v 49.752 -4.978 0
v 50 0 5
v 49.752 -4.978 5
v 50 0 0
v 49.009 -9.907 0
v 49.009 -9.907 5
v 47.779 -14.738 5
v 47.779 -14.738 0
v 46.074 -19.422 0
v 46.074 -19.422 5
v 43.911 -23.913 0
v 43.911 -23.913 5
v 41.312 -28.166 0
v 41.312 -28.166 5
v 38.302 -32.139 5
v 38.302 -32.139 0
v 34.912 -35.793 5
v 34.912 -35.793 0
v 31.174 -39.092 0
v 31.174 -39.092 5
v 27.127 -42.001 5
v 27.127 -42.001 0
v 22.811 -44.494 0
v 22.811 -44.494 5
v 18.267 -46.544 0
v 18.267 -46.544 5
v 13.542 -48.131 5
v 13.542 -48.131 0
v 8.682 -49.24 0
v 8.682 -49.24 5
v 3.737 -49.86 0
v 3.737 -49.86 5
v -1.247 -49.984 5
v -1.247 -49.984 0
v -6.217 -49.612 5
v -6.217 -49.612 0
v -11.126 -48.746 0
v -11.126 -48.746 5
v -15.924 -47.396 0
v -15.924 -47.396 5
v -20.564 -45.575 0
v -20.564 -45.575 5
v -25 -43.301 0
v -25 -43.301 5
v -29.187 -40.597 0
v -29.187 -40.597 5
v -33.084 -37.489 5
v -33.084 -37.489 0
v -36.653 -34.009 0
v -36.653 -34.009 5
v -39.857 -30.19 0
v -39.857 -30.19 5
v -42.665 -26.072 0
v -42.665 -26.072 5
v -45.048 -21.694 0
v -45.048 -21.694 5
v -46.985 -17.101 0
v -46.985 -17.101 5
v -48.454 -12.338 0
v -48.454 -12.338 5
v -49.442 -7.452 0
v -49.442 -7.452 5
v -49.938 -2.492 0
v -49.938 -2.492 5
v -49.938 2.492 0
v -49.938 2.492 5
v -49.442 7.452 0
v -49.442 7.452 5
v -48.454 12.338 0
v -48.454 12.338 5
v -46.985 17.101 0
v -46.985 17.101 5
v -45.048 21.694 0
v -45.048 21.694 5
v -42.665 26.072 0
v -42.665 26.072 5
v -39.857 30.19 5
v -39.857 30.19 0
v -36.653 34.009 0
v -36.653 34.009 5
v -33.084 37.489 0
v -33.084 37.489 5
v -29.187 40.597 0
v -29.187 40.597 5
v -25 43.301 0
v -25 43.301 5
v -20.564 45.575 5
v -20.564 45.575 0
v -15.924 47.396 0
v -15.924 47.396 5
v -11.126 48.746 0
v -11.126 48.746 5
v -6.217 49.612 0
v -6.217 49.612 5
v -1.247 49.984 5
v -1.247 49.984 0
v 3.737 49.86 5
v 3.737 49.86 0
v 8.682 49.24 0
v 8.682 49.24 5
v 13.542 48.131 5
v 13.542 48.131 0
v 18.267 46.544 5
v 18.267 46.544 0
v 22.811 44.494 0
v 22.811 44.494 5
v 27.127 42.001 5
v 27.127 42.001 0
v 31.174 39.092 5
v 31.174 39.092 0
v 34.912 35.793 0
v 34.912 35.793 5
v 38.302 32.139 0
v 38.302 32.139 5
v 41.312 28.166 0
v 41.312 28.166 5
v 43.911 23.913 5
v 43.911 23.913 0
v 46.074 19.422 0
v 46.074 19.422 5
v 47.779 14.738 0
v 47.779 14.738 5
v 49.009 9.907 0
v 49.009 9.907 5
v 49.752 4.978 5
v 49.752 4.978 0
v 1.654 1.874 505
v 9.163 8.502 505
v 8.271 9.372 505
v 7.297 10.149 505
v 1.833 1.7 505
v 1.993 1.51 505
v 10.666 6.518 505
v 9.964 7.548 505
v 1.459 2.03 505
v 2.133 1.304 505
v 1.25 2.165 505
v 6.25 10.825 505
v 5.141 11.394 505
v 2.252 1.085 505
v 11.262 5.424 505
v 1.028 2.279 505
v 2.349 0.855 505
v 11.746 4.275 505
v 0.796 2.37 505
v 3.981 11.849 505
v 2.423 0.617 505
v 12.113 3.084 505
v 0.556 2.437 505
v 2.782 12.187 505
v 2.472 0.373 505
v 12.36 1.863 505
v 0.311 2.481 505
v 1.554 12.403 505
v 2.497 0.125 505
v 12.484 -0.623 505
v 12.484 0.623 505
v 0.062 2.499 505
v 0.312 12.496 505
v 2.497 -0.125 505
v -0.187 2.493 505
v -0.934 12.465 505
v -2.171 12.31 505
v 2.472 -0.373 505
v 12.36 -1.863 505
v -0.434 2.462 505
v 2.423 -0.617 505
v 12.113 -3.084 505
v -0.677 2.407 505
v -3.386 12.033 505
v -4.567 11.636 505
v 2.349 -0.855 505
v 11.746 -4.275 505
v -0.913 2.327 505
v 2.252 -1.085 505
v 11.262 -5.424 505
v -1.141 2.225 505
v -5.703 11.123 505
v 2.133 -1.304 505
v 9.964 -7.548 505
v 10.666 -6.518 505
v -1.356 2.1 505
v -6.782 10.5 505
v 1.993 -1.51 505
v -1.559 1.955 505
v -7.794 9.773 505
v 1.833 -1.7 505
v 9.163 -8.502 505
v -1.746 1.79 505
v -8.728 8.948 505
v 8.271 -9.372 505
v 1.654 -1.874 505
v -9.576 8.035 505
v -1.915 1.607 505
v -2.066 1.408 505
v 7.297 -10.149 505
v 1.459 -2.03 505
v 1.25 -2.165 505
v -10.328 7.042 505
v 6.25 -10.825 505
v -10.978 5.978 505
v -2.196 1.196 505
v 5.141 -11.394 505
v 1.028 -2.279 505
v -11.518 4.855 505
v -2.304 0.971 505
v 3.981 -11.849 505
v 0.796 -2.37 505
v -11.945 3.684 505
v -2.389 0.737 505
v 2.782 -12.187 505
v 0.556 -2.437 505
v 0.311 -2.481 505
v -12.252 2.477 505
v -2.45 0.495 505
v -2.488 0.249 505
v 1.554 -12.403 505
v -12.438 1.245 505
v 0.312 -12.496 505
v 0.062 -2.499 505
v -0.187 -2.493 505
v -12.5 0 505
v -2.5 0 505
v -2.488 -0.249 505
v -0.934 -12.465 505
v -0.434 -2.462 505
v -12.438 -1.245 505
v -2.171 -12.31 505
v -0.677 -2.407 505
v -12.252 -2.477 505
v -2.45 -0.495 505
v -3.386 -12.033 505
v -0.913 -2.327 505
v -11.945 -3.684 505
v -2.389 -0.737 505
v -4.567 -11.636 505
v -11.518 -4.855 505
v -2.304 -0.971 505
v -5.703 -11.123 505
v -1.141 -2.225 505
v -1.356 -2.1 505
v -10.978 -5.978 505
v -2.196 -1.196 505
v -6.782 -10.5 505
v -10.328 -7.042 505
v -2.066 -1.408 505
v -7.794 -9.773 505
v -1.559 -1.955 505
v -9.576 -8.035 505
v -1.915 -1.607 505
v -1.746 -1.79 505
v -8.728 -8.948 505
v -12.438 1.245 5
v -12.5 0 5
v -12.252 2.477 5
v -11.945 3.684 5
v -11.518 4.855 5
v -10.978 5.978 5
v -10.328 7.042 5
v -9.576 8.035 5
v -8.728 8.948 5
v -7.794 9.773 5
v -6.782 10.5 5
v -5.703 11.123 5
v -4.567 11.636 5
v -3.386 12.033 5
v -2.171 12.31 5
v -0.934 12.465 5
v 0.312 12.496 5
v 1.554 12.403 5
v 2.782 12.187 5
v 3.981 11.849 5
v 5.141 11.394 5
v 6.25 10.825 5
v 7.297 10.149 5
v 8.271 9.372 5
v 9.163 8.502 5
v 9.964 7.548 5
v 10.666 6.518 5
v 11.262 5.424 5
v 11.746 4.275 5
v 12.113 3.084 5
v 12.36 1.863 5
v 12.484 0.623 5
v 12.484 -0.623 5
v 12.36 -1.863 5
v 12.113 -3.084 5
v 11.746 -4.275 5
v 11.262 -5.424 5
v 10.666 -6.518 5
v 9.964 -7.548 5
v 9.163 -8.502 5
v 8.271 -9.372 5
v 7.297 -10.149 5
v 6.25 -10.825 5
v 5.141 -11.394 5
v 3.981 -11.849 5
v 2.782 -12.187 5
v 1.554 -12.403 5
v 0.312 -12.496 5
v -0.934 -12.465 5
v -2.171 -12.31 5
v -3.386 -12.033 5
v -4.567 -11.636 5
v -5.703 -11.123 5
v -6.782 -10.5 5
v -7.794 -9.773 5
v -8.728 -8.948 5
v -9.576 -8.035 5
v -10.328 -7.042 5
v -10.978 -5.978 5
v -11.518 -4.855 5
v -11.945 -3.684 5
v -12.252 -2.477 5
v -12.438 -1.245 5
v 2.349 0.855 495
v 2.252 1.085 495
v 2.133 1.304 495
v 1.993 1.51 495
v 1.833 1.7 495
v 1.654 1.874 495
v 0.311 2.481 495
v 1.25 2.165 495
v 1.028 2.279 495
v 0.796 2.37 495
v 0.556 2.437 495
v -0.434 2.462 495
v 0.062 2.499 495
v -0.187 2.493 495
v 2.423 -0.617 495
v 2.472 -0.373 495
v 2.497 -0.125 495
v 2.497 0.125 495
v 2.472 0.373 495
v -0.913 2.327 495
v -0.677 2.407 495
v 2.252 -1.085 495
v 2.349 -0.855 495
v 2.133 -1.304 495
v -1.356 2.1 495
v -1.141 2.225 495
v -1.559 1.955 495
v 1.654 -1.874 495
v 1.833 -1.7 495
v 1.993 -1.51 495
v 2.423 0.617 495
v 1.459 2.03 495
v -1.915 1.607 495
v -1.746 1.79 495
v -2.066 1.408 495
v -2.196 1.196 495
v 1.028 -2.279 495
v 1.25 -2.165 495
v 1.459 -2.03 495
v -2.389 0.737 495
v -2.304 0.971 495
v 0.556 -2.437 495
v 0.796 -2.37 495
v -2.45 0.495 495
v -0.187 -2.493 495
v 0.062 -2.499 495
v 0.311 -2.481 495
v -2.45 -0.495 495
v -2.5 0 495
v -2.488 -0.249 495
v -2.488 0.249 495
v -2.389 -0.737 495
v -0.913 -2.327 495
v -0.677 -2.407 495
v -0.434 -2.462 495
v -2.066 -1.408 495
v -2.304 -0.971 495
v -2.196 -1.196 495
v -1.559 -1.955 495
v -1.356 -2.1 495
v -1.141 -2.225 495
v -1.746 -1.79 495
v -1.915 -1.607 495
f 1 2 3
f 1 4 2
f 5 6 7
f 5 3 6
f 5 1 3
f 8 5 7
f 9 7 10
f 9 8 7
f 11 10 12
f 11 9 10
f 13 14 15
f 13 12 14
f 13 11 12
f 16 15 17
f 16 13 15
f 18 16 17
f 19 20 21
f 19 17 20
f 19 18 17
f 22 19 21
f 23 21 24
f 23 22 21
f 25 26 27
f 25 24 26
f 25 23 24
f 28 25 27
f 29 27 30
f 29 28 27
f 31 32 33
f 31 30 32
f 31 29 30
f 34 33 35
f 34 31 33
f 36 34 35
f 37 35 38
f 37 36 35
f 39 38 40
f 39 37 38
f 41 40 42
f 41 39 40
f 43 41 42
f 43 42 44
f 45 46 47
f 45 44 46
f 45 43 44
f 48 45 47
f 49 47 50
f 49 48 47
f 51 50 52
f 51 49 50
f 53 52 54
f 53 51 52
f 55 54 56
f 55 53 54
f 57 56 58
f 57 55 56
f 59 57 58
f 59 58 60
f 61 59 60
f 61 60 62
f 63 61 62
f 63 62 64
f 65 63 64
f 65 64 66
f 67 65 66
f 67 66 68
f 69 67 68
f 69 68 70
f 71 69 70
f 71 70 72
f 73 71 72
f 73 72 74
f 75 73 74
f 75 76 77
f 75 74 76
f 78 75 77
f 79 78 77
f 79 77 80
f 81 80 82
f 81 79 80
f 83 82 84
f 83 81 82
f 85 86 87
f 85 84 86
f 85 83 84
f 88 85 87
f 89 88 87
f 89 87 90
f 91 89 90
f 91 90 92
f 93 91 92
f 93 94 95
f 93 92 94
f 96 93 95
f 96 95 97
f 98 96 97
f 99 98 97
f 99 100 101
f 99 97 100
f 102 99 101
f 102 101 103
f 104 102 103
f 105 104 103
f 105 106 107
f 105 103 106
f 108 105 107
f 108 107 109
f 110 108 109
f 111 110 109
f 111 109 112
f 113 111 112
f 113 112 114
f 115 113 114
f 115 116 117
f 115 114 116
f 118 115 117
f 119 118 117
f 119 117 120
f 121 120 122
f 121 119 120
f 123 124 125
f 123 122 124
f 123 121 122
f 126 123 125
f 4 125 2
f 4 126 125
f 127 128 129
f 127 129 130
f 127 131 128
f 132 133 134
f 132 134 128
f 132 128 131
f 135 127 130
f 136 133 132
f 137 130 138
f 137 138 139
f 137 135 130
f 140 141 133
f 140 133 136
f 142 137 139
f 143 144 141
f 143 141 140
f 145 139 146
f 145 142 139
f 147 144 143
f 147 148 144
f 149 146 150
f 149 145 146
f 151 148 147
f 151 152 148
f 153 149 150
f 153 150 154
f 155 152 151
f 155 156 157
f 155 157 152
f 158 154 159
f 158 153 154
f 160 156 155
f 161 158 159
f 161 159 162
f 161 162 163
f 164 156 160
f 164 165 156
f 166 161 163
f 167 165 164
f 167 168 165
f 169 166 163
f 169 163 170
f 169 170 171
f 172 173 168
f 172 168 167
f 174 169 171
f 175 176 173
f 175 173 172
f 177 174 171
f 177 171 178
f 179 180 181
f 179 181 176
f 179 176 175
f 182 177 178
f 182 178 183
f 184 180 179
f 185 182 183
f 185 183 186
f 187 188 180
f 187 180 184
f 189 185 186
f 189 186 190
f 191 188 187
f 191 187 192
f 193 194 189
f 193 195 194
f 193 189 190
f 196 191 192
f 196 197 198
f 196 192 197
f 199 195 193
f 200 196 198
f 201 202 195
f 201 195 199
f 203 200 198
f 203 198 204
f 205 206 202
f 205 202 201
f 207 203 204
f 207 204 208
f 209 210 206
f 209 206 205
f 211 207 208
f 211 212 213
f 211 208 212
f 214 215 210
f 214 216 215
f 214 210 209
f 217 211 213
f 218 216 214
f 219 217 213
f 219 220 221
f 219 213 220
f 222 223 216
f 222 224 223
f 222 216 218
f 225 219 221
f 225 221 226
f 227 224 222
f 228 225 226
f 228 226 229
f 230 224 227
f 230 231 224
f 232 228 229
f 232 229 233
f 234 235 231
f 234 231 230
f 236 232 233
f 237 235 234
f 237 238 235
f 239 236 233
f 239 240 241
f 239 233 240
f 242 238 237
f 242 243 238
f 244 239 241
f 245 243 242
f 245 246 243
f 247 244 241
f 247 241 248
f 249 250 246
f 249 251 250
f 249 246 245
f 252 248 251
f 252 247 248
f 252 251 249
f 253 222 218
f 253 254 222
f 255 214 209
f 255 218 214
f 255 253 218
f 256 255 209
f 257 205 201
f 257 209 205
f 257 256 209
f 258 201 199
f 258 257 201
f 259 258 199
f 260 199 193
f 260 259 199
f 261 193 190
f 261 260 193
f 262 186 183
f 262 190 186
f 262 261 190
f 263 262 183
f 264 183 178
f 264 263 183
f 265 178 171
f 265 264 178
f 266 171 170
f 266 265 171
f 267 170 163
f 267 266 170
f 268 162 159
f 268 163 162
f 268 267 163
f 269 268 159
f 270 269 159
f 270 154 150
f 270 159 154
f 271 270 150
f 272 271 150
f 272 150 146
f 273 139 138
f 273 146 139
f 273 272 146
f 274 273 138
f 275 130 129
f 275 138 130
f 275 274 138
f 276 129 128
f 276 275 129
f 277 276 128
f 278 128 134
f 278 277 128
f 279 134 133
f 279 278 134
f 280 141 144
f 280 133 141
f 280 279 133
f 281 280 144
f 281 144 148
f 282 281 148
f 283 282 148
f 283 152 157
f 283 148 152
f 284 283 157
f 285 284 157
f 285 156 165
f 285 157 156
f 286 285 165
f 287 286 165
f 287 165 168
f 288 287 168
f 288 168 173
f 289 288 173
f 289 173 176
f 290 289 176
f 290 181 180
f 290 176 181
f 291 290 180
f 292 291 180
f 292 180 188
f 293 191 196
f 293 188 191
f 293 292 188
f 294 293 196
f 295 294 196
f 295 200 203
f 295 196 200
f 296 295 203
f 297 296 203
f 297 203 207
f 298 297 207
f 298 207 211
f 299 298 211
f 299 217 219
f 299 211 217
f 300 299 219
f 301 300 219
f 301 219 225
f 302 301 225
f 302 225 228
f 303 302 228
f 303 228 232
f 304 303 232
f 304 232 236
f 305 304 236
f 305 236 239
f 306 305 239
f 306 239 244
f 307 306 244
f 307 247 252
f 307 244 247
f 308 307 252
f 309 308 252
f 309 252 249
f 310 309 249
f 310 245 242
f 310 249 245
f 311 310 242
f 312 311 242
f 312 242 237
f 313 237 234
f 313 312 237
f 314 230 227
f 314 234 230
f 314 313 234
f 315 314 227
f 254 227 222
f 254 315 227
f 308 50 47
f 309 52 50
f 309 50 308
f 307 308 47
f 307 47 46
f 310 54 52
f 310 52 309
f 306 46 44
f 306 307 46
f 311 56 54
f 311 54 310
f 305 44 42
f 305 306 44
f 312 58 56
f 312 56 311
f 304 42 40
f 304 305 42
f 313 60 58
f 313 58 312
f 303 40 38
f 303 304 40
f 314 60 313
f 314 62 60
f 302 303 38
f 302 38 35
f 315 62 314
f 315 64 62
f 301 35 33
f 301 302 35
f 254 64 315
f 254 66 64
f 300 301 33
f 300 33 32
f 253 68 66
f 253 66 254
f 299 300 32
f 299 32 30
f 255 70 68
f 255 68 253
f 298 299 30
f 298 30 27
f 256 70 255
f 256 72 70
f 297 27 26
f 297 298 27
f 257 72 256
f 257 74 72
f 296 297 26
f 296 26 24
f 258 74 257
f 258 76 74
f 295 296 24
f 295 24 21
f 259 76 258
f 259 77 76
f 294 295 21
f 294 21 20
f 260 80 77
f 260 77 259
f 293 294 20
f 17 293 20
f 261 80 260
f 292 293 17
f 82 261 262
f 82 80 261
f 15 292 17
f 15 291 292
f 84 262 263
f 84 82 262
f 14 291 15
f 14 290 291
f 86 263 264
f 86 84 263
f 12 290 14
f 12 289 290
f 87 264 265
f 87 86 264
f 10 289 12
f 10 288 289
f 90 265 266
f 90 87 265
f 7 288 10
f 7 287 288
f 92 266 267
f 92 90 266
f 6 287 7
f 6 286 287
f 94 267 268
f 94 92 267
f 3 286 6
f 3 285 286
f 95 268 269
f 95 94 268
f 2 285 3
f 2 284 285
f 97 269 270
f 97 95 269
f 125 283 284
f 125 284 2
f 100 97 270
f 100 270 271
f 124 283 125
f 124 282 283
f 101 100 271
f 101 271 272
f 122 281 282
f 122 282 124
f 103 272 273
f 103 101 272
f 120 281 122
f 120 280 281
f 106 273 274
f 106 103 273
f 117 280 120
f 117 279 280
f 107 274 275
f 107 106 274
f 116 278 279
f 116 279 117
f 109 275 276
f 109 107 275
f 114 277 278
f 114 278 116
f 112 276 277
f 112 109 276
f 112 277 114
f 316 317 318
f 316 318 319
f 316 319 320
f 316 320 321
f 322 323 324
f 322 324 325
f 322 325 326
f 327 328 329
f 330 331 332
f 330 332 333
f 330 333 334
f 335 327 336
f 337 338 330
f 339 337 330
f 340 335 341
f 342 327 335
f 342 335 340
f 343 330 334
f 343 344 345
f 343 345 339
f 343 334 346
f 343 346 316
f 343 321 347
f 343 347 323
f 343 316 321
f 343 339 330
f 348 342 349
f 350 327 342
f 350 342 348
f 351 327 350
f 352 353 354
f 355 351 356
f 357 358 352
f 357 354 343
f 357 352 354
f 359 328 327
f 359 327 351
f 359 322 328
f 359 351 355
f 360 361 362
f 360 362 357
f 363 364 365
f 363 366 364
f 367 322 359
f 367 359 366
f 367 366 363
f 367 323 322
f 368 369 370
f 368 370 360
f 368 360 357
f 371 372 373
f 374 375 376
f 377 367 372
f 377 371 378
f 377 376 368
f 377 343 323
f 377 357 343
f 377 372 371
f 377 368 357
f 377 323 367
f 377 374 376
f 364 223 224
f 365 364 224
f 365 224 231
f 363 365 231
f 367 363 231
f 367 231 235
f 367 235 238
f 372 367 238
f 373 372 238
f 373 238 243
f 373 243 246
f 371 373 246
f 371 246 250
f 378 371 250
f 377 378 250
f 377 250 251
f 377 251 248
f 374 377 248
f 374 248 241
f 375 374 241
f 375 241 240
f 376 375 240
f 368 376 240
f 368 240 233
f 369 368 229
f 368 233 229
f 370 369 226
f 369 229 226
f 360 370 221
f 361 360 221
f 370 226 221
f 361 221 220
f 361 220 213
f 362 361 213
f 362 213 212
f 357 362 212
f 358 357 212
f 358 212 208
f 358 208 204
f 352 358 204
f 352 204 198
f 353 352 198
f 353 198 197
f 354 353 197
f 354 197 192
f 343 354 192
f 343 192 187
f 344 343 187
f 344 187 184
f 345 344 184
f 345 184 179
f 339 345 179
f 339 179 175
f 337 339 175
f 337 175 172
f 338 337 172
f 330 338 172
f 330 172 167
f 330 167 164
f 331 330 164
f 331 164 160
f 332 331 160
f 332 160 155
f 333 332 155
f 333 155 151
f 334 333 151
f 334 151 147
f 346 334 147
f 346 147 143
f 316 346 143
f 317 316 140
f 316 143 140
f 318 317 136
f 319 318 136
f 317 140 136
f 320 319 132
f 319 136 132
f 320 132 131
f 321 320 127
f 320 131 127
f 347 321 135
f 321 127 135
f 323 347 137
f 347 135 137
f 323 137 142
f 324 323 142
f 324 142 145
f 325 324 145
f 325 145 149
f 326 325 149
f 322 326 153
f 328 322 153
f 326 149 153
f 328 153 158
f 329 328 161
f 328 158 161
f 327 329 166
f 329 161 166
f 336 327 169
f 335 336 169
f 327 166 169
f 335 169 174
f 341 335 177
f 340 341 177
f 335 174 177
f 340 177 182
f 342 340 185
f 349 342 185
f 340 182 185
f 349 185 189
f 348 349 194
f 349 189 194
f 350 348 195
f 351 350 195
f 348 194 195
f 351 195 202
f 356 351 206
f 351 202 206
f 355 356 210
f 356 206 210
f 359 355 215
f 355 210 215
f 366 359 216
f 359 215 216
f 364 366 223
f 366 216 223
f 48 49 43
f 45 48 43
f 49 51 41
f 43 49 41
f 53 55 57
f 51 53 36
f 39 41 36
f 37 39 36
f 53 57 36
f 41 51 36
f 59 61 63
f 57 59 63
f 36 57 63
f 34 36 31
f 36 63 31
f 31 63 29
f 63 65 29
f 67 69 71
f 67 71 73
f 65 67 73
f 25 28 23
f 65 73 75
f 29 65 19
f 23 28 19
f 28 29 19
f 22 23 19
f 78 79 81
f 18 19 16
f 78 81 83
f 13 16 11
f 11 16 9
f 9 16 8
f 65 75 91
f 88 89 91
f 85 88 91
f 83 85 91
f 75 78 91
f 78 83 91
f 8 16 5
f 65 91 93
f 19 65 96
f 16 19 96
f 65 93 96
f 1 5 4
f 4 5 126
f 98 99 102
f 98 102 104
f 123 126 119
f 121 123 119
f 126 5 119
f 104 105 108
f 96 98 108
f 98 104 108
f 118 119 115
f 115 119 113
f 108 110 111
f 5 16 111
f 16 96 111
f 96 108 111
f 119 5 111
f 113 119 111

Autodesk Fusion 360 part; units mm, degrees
sketch "Sketch1" plane through (0, 0, 0) normal (0, 0, 1) x (1, 0, 0)
  circle A0 centre (0, 0) radius 50
  dimension "d1" = 100
extrude "Extrude1" add sketch "Sketch1" along normal blind 5
sketch "Sketch2" plane through (0, 0, 5) normal (0, 0, 1) x (-1, 0, 0)
  circle A0 centre (0, 0) radius 50
  circle A1 centre (0, 0) radius 12.5
  dimension "d4" = 25
extrude "Extrude2" add sketch "Sketch2" along normal blind 500 contours A1
sketch "Sketch3" plane through (0, 0, 505) normal (0, 0, 1) x (-1, 0, 0)
  circle A0 centre (0, 0) radius 12.5
  circle A1 centre (0, 0) radius 2.5
  dimension "d7" = 5
extrude "Extrude3" cut sketch "Sketch3" against normal blind 10 contours A1
